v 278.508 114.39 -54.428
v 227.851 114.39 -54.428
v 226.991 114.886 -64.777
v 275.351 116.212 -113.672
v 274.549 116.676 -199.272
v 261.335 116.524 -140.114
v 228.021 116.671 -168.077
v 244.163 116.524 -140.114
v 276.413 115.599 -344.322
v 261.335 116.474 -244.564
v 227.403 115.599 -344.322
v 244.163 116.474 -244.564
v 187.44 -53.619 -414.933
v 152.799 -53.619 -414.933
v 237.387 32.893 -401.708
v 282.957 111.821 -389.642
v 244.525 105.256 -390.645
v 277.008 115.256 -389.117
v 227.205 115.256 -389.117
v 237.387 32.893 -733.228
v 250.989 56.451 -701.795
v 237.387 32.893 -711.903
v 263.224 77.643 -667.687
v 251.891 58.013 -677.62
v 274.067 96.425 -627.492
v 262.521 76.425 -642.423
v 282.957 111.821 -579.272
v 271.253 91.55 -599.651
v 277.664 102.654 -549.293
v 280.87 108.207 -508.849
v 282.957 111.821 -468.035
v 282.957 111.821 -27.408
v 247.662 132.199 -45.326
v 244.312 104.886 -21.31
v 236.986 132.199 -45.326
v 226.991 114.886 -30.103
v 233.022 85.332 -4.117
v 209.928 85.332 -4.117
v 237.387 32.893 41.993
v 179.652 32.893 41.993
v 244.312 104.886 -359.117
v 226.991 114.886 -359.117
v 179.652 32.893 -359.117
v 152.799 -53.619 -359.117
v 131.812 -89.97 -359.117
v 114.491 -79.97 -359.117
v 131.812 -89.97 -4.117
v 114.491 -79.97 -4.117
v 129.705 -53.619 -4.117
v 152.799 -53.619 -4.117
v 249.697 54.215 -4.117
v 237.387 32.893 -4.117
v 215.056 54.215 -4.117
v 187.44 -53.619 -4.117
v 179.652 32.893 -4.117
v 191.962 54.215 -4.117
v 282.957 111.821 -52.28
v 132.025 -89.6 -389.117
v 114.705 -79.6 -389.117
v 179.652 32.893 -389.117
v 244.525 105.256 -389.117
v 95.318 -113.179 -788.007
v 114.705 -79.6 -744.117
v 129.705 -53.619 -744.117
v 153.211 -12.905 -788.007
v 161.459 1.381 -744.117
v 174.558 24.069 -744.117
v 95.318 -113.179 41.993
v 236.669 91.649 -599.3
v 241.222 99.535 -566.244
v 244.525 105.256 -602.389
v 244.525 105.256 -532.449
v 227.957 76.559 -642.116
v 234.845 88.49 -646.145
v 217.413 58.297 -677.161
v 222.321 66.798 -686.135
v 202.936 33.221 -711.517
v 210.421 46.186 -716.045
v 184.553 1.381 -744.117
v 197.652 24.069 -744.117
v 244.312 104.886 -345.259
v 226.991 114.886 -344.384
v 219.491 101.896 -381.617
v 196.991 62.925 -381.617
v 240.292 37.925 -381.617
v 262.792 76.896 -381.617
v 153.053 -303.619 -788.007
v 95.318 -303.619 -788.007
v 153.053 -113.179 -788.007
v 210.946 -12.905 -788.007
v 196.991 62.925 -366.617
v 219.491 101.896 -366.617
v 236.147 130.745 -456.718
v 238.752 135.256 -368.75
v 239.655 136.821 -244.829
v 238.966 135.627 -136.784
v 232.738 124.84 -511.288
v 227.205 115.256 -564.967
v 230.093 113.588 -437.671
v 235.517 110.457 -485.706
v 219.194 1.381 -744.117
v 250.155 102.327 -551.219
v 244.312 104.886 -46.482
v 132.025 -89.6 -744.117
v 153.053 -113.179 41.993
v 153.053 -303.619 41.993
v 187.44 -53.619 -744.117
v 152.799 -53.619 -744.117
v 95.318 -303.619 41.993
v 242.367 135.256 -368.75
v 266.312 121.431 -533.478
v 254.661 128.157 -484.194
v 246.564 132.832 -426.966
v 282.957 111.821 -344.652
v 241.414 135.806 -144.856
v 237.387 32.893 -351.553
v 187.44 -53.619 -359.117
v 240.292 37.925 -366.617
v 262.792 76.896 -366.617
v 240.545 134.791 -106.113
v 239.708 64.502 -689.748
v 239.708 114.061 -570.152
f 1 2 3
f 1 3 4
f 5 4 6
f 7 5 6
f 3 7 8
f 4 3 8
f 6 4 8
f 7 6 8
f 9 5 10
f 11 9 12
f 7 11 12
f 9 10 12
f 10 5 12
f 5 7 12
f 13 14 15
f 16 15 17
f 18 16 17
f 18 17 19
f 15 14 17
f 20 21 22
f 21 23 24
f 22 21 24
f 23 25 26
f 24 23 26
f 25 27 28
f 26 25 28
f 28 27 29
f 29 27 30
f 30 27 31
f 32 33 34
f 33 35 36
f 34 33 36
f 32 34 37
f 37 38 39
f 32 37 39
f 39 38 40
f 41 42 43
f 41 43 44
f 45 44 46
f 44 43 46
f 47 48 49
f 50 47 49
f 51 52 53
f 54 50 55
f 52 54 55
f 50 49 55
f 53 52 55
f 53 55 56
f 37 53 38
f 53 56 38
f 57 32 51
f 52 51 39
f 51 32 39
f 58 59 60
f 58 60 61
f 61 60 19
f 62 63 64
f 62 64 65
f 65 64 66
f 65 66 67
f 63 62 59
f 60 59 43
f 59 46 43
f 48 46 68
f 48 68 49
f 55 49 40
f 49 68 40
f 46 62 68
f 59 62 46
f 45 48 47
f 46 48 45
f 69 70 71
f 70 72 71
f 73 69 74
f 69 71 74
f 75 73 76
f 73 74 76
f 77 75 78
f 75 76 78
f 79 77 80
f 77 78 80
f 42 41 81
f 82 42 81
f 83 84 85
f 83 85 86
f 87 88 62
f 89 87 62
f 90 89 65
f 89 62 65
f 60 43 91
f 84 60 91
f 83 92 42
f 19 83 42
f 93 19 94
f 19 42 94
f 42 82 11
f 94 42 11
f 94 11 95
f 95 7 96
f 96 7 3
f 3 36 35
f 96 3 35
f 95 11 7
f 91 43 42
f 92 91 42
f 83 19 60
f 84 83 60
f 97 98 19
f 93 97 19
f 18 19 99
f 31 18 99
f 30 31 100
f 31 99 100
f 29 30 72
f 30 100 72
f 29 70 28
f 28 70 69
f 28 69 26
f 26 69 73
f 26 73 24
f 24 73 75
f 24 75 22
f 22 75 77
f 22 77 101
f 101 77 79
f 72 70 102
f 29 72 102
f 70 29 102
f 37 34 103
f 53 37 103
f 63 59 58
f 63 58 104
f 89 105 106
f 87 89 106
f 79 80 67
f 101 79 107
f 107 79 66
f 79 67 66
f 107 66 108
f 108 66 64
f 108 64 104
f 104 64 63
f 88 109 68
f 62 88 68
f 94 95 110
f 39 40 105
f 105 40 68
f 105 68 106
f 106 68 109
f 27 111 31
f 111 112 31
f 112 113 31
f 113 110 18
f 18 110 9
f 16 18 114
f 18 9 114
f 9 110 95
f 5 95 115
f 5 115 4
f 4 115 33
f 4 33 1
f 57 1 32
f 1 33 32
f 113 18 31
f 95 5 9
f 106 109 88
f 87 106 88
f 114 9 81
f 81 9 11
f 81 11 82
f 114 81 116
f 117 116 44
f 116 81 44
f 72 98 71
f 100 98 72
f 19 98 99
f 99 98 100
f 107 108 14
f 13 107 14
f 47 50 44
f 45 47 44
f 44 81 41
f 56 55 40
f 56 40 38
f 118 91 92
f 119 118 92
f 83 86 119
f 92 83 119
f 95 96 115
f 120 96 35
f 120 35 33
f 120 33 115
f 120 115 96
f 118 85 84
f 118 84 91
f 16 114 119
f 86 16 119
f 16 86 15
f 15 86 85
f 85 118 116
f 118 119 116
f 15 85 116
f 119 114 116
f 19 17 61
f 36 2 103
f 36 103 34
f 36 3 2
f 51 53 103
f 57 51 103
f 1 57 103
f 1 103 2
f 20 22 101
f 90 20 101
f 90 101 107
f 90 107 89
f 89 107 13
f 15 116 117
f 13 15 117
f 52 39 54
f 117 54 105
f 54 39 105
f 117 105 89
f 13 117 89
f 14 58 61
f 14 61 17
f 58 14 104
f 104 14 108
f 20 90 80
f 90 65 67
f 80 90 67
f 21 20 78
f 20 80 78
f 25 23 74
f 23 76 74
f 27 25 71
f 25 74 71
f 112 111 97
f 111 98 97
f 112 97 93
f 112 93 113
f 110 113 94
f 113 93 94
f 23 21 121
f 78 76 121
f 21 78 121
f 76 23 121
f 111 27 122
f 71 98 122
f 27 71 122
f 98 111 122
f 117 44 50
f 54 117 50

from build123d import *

# Parameters (mm, degrees)
EXTRUDE_1_DEPTH          = 300
CUT_EXTRUDE_1_DEPTH      = 1.0000001
CUT_EXTRUDE_1_DEPTH_BACK = 831.0000001
SKETCH_4_W               = 15
SKETCH_4_H               = 45
CUT_EXTRUDE_2_DEPTH      = 258.720162759
SKETCH_4_3_W             = 15
SKETCH_4_3_H             = 45
CUT_EXTRUDE_3_DEPTH      = 20


with BuildPart() as part:
    # 스케치1 → 보스-돌출1 (new body)
    with BuildSketch(Plane(origin=(0, 0, 0), x_dir=(0, 0, -1), z_dir=(1, 0, 0))):
        with BuildLine():
            Line((-41.993007726, 32.892860384), (-41.993007726, -303.619075042))
            Line((-41.993007726, -303.619075042), (788.006992274, -303.619075042))
            Line((788.006992274, -303.619075042), (788.006992274, -12.90547458))
            add(Edge.make_bspline(
                [(788.006992274, -12.90547458), (680.261509472, 78.254339674), (631.210016853, 128.415858034), (368.750142796, 135.255878696)],
                knots=[0, 0, 0, 0, 1, 1, 1, 1], degree=3))
            add(Edge.make_bspline(
                [(45.325655749, 132.198658827), (134.989620851, 137.211386353), (265.463569923, 138.011524869), (368.750142796, 135.255878696)],
                knots=[0, 0, 0, 0, 1, 1, 1, 1], degree=3))
            Line((45.325655749, 132.198658827), (-41.993007726, 32.892860384))
        make_face()
        with BuildLine():
            Line((4.116595834, 54.214584045), (54.427658026, 114.389853292))
            add(Edge.make_bspline(
                [(54.427658026, 114.389853292), (122.914694658, 118.068796405), (254.727094278, 116.434615788), (344.321994749, 115.599177573)],
                knots=[0, 0, 0, 0, 0.843637698, 0.843637698, 0.843637698, 0.843637698], degree=3))
            Line((344.321994749, 115.599177573), (359.116595834, -53.619075042))
            Line((359.116595834, -53.619075042), (4.116595834, -53.619075042))
            Line((4.116595834, -53.619075042), (4.116595834, 54.214584045))
        make_face(mode=Mode.SUBTRACT)
        with BuildLine():
            Line((414.932922958, -53.619075042), (389.116595834, 115.255878696))
            add(Edge.make_bspline(
                [(389.116595834, 115.255878696), (584.597474826, 110.825479528), (668.447748965, 84.913988672), (744.116595834, 1.380924958)],
                knots=[0.027735734, 0.027735734, 0.027735734, 0.027735734, 0.842070206, 0.842070206, 0.842070206, 0.842070206], degree=3))
            Line((744.116595834, 1.380924958), (744.116595834, -53.619075042))
            Line((744.116595834, -53.619075042), (414.932922958, -53.619075042))
        make_face(mode=Mode.SUBTRACT)
    extrude(amount=EXTRUDE_1_DEPTH)

    # 스케치2 → 컷-돌출1 (cut, two sides)
    with BuildSketch(Plane.XY.offset(41.993007726)) as cut_extrude_1_sk:
        Polygon((179.652203691, 32.892860384), (239.655287588, 136.821250303), (282.956557777, 111.821250303), (237.38723061, 32.892860384), (300, 32.892860384), (300, -303.619075042), (341.364714008, -303.619075042), (341.364714008, 251.457374482), (0, 251.457374482), (0, 32.892860384), align=None)
        Polygon((95.31772029, -113.178749697), (179.652203691, 32.892860384), (0, 32.892860384), (0, -303.619075042), (95.31772029, -303.619075042), align=None)
        Polygon((300, 32.892860384), (237.38723061, 32.892860384), (153.052747209, -113.178749697), (153.052747209, -303.619075042), (300, -303.619075042), align=None)
    extrude(amount=CUT_EXTRUDE_1_DEPTH, mode=Mode.SUBTRACT)
    extrude(cut_extrude_1_sk.sketch, amount=-CUT_EXTRUDE_1_DEPTH_BACK, mode=Mode.SUBTRACT)

    # 스케치4 → 컷-돌출2 (cut, through all)
    with BuildSketch(Plane(origin=(120.496126421, -69.568471025, 0), x_dir=(0, 0, 1), z_dir=(-0.866025404, 0.5, 0))):
        with Locations((-374.116595834, 175.489898801)):
            Rectangle(SKETCH_4_W, SKETCH_4_H)
    extrude(amount=-CUT_EXTRUDE_2_DEPTH, mode=Mode.SUBTRACT)

    # 스케치4<3> → 컷-돌출3 (cut)
    with BuildSketch(Plane(origin=(120.496126421, -69.568471025, 0), x_dir=(0, 0, 1), z_dir=(-0.866025404, 0.5, 0))):
        Polygon((-744.116595834, 18.416776129), (-744.116595834, 213.416776129), (-389.116595834, 213.416776129), (-389.116595834, 17.989898801), (-389.116595834, -11.583223871), (-744.116595834, -11.583223871), align=None)
        Polygon((-359.116595834, 18.416776129), (-359.116595834, 212.989898801), (-4.116595834, 212.989898801), (-4.116595834, 17.989898801), (-4.116595834, -12.010101199), (-359.116595834, -12.010101199), align=None)
        with Locations((-374.116595834, 175.489898801)):
            Rectangle(SKETCH_4_3_W, SKETCH_4_3_H)
    extrude(amount=-CUT_EXTRUDE_3_DEPTH, mode=Mode.SUBTRACT)


solid = part.part
